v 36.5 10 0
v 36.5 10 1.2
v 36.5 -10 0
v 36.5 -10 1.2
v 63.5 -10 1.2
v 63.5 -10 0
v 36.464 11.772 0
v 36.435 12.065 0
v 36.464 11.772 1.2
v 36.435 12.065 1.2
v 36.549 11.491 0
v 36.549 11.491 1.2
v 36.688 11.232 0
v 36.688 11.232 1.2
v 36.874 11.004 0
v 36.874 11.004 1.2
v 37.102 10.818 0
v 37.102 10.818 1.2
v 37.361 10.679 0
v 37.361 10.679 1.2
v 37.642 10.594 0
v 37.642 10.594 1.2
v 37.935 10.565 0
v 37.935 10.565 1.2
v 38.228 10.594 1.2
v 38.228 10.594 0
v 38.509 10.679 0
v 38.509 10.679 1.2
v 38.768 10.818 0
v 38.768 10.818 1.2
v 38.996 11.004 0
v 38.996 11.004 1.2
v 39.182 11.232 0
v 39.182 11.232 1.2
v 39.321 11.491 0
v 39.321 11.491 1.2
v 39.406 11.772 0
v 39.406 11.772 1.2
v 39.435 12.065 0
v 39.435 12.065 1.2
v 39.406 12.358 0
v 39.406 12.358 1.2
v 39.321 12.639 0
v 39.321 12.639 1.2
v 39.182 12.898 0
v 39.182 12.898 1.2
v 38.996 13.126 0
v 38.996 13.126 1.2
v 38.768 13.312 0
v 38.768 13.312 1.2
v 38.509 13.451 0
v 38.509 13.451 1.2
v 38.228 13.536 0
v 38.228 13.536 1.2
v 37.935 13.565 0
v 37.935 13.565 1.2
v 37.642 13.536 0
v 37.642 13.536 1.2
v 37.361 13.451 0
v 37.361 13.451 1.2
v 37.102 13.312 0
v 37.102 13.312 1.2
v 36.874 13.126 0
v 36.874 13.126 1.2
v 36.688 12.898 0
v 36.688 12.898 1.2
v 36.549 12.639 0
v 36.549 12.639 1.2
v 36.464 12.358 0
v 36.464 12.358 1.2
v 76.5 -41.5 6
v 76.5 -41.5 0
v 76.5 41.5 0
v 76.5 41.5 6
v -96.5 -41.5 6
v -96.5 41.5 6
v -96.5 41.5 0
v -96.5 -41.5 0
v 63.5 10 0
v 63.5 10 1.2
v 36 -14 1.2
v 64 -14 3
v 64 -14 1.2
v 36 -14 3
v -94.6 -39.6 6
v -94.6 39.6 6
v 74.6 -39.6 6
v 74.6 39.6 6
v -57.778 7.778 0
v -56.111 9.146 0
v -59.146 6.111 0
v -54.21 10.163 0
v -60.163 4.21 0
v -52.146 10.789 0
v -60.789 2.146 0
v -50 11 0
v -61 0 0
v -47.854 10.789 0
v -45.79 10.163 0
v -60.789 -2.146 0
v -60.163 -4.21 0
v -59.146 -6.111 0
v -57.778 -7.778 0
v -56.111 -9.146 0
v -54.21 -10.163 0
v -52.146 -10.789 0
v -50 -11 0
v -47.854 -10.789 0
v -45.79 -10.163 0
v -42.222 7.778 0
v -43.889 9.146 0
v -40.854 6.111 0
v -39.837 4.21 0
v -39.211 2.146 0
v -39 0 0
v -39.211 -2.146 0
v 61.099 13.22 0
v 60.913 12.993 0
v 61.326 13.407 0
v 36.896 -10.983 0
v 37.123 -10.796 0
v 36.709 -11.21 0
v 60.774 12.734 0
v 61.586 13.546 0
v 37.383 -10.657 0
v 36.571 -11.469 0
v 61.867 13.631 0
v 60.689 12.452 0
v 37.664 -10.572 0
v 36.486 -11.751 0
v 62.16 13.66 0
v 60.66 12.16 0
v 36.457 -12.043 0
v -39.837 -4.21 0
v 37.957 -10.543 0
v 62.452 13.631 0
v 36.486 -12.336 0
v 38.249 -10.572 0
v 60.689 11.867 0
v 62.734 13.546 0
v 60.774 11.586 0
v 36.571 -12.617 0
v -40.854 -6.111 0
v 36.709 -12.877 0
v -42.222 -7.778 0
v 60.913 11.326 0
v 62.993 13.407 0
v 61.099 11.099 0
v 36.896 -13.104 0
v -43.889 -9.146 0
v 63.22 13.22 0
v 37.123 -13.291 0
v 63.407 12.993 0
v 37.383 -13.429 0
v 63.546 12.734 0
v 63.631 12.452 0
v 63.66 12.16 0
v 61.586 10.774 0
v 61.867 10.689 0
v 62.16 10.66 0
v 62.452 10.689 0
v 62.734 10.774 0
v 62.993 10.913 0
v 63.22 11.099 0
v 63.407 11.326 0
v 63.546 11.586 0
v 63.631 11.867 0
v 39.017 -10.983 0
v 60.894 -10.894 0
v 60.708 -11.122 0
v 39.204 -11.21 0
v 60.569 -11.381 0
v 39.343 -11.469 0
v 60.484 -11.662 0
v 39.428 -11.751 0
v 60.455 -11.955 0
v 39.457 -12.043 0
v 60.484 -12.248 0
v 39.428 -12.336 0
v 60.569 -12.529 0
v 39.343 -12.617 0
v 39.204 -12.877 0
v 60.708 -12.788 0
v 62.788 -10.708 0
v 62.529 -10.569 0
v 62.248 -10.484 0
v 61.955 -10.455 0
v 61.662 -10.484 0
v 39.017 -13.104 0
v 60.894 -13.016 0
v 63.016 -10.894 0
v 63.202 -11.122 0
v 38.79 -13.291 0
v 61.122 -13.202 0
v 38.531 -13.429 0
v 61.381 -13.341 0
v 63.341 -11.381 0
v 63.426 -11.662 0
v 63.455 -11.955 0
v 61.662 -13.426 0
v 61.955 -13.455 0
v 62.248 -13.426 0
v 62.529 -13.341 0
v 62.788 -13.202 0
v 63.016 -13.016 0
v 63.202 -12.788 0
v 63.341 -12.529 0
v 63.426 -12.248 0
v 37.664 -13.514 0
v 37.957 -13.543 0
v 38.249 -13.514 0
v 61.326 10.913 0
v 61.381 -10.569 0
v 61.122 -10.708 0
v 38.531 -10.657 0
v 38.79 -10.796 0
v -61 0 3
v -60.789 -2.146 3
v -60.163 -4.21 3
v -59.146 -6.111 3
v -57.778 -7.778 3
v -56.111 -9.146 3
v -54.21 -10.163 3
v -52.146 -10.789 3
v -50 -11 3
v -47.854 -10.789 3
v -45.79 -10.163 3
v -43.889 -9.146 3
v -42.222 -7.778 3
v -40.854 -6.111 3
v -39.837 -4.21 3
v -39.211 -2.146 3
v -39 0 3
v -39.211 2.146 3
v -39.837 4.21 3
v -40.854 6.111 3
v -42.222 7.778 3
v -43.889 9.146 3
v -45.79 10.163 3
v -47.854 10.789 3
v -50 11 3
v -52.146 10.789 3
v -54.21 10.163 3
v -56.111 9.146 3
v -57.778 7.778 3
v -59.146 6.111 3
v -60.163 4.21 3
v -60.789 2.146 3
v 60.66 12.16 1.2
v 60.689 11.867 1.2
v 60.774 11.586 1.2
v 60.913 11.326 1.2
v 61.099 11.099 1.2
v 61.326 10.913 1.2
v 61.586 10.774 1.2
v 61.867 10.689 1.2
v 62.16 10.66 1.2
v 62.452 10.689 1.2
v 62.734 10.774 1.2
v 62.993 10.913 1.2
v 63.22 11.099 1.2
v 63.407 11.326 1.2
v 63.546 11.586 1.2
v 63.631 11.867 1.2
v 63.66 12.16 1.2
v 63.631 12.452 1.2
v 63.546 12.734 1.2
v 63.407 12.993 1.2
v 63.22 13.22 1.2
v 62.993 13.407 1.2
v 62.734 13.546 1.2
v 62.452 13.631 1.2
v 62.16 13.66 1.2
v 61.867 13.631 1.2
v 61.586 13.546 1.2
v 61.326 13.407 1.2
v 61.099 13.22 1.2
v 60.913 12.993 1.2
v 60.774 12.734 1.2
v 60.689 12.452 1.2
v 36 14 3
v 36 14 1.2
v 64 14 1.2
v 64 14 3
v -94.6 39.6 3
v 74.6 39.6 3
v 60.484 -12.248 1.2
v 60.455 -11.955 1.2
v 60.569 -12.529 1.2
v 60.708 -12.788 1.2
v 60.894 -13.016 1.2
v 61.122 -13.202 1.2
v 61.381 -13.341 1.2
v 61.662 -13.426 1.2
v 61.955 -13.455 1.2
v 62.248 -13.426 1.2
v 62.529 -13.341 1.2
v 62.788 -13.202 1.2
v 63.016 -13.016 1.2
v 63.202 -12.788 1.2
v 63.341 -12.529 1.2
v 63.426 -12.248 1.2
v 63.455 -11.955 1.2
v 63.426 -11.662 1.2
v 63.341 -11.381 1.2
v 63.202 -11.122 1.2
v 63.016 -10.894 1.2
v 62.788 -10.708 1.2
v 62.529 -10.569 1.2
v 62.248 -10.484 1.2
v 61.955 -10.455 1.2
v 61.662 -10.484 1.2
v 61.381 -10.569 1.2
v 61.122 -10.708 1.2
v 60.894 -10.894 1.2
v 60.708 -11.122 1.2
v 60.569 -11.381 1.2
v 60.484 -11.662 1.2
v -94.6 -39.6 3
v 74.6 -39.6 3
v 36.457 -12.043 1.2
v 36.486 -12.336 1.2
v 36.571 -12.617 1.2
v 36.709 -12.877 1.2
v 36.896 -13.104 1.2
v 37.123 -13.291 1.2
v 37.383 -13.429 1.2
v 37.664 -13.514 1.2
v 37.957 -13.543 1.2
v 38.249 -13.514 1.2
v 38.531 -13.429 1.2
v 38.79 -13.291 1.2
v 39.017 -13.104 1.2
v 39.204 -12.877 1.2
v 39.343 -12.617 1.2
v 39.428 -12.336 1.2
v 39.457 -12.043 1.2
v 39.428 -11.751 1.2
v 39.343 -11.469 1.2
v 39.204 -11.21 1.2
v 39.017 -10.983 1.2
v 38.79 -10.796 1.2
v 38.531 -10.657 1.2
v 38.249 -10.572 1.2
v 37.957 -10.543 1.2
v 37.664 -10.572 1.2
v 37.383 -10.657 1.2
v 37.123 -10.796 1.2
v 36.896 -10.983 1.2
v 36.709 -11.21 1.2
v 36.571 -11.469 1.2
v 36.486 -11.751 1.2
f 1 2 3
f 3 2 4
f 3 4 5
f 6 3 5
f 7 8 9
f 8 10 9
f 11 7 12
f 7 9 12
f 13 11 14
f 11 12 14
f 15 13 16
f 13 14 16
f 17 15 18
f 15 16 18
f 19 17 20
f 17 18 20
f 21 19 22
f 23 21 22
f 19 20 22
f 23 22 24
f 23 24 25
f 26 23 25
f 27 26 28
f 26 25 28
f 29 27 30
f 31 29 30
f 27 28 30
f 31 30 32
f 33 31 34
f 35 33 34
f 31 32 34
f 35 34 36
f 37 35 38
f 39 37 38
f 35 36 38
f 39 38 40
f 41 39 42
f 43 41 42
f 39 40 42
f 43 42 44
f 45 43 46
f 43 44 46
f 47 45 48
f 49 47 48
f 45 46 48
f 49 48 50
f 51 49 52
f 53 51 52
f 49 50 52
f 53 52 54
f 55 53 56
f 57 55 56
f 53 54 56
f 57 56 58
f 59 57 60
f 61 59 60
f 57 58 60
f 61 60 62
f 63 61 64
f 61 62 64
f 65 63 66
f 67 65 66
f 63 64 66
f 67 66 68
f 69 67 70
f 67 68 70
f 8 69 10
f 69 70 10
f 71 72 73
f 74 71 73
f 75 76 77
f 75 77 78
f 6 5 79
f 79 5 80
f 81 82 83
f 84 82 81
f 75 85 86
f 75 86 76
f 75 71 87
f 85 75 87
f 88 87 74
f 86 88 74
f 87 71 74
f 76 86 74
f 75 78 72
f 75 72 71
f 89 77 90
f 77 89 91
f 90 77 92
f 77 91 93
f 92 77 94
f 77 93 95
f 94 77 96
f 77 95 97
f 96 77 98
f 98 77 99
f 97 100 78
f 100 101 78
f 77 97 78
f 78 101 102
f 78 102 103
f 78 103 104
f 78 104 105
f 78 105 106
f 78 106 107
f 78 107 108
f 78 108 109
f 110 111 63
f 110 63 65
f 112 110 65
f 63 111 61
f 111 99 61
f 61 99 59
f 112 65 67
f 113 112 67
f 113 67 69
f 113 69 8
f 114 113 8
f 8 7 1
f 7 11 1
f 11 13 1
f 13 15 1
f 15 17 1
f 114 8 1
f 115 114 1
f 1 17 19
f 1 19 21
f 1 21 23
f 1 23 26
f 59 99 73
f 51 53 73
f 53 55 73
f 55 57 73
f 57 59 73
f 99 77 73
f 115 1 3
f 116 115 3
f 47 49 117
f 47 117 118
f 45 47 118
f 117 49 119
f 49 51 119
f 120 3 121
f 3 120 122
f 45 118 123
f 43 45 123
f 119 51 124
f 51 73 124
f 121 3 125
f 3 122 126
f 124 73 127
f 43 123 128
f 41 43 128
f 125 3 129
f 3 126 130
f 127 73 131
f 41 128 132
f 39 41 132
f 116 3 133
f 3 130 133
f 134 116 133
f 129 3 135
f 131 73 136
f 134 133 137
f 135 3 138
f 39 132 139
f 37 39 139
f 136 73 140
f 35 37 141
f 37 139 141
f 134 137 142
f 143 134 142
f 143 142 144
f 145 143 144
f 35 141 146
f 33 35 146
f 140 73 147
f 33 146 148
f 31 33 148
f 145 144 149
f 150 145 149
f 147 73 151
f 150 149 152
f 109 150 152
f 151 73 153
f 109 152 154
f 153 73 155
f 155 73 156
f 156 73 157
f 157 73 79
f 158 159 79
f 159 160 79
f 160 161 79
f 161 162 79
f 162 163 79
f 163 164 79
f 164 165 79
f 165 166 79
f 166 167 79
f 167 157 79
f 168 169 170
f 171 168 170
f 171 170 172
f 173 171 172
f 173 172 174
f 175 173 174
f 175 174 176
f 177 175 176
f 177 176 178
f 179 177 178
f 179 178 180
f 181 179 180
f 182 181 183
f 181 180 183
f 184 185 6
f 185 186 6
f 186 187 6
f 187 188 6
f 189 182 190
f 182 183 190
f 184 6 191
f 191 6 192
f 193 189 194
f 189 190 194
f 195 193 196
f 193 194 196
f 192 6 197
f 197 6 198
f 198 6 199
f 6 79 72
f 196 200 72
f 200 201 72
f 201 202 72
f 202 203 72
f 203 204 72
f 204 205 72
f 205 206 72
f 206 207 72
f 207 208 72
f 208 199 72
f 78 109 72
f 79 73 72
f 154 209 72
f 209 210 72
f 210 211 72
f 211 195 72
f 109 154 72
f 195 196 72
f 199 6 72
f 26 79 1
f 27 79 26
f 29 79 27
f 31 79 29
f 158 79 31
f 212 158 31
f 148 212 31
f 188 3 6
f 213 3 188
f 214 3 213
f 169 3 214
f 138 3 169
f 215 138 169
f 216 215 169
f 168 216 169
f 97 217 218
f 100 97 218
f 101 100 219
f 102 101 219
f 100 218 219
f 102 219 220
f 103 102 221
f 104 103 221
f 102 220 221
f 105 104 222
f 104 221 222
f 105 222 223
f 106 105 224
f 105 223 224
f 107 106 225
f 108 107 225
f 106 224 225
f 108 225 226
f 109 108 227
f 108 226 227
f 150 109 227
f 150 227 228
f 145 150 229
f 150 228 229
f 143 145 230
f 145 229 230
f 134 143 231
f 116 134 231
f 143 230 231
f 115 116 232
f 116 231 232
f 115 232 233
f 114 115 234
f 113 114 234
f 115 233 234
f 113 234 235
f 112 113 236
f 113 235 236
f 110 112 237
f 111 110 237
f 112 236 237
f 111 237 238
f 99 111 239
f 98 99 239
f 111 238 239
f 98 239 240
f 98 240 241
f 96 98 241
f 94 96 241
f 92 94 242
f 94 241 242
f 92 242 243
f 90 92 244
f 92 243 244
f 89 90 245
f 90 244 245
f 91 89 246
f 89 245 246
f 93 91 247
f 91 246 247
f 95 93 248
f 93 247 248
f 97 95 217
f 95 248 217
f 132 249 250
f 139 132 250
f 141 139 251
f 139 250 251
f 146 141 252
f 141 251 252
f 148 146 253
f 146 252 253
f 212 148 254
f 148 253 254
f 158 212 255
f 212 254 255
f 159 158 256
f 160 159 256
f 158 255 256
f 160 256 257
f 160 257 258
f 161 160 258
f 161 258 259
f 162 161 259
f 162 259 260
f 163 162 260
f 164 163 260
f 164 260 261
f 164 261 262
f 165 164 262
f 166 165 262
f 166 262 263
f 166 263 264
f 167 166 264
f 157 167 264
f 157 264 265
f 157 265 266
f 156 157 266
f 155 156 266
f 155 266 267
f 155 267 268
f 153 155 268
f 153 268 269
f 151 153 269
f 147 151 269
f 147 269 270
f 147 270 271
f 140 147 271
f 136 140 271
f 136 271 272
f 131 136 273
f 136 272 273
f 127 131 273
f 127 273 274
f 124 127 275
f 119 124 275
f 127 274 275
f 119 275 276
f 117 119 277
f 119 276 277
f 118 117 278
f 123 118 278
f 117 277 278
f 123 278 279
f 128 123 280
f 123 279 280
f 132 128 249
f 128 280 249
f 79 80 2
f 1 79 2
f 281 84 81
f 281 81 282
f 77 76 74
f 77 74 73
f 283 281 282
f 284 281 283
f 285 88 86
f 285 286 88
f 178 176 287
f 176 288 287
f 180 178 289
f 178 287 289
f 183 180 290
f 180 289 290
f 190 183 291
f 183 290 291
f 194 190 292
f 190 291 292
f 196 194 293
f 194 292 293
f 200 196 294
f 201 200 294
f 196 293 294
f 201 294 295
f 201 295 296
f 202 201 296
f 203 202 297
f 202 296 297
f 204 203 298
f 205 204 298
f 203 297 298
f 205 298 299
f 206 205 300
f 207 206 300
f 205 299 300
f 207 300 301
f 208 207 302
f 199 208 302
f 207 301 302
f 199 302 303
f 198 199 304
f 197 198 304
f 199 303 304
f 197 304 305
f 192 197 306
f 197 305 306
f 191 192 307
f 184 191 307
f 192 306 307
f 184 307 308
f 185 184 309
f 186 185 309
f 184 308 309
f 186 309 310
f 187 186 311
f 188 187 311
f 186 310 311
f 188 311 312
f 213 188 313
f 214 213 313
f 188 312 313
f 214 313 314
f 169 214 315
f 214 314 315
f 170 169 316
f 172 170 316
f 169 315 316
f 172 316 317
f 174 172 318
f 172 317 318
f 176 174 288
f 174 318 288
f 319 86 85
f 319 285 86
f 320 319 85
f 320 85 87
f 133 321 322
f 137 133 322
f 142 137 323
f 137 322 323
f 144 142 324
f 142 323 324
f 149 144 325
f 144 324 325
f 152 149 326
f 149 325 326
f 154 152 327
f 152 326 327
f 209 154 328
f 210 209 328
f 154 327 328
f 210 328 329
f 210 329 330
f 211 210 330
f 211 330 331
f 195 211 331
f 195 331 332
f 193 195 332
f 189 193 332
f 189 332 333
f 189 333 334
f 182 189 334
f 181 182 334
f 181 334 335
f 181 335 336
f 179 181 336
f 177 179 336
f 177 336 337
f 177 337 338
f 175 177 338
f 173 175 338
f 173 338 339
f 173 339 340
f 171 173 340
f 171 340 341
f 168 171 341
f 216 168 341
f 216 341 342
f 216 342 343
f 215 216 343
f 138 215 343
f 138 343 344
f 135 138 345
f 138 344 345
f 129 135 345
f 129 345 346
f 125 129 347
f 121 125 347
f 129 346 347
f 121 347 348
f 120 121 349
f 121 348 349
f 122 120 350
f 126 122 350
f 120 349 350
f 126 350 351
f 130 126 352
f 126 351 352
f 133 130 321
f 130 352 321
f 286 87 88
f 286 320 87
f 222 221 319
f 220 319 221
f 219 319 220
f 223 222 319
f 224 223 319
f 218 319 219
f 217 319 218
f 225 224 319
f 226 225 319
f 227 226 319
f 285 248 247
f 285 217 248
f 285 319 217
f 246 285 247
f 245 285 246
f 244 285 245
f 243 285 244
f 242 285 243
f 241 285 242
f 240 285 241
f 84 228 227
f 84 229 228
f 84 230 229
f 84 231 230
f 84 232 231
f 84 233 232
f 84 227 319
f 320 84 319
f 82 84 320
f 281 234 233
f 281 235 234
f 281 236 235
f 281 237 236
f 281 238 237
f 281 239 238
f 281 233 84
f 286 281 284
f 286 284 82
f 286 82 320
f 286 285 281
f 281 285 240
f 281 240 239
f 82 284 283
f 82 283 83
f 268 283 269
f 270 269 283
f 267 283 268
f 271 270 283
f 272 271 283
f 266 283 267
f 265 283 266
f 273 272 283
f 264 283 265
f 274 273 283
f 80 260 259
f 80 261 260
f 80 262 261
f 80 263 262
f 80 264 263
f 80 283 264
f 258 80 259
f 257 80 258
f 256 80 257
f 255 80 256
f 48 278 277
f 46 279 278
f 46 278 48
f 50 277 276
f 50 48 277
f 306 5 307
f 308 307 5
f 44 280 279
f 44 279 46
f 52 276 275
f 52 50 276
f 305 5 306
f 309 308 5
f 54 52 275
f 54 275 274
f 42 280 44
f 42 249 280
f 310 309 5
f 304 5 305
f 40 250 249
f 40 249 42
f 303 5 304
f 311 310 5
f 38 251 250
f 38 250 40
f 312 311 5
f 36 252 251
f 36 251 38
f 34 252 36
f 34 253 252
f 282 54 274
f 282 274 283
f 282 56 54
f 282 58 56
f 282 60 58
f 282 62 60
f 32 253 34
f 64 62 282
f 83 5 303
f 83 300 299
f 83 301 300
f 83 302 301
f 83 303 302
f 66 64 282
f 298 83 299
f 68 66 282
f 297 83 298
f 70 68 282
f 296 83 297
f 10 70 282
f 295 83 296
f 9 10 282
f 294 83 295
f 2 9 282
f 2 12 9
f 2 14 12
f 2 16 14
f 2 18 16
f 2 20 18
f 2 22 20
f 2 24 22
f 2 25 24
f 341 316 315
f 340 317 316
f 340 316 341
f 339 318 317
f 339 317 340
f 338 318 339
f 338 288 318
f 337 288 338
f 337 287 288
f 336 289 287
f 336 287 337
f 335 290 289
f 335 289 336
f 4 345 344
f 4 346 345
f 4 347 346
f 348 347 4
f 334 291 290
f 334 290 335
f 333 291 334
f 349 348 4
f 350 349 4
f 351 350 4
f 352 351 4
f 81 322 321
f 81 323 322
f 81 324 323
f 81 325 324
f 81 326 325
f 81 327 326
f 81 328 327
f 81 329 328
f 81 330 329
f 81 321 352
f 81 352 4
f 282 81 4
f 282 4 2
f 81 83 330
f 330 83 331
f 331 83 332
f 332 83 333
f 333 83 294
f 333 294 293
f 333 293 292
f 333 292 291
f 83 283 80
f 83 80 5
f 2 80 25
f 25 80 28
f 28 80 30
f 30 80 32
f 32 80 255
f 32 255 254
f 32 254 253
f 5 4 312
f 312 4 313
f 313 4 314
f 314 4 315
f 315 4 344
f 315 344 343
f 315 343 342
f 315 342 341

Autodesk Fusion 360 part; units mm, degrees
sketch "Sketch1" plane through (0, 0, 0) normal (0, 0, 1) x (1, 0, 0)
  line L0 (76.5, 41.5) -> (-76.5, 41.5)
  line L1 (-76.5, 41.5) -> (-76.5, -41.5)
  line L2 (-76.5, -41.5) -> (76.5, -41.5)
  line L3 (76.5, -41.5) -> (76.5, 41.5)
  line L4 (76.5, 41.5) -> (-76.5, -41.5) construction
  line L5 (-76.5, 41.5) -> (76.5, -41.5) construction
  dimension "d1" = 153
  dimension "d2" = 83
extrude "Extrude1" add sketch "Sketch1" along normal blind 3
sketch "Sketch2" plane through (0, 0, 3) normal (0, 0, 1) x (-1, 0, 0)
  line L0 (-76.5, 41.5) -> (-76.5, -41.5)
  line L1 (-76.5, -41.5) -> (76.5, -41.5)
  line L2 (76.5, -41.5) -> (76.5, 41.5)
  line L3 (76.5, 41.5) -> (-76.5, 41.5)
  line L4 (-74.6, -39.6) -> (74.6, -39.6)
  line L5 (74.6, -39.6) -> (74.6, 39.6)
  line L6 (74.6, 39.6) -> (-74.6, 39.6)
  line L7 (-74.6, 39.6) -> (-74.6, -39.6)
  dimension "d5" = -1.9
extrude "Extrude2" add sketch "Sketch2" along normal blind 3
sketch "Sketch3" plane through (-76.5, 0, 0) normal (-1, 0, 0) x (0, -1, 0)
  line L0 (-41.5, 0) -> (41.5, 0)
  line L1 (41.5, 0) -> (41.5, 6)
  line L2 (41.5, 6) -> (-41.5, 6)
  line L3 (-41.5, 6) -> (-41.5, 0)
sketch "Sketch4" plane through (0, 0, 0) normal (0, 1, 0) x (1, 0, 0)
sketch "Sketch5" plane through (0, 0, 3) normal (0, 0, 1) x (-1, 0, 0)
  line L0 (-74.6, -39.6) -> (74.6, -39.6)
  line L1 (74.6, -39.6) -> (74.6, 39.6)
  line L2 (74.6, 39.6) -> (-74.6, 39.6)
  line L3 (-74.6, 39.6) -> (-74.6, -39.6)
  line L4 (-36.5, 10) -> (-63.5, 10)
  line L5 (-63.5, 10) -> (-63.5, -10)
  line L6 (-63.5, -10) -> (-36.5, -10)
  line L7 (-36.5, -10) -> (-36.5, 10)
  line L8 (-36.5, 10) -> (-63.5, -10) construction
  line L9 (-63.5, 10) -> (-36.5, -10) construction
  line L10 (-36, -14) -> (-64, -14)
  line L11 (-64, -14) -> (-64, 14)
  line L12 (-64, 14) -> (-36, 14)
  line L13 (-36, 14) -> (-36, -14)
  line L14 (-36, -14) -> (-64, 14) construction
  line L15 (-64, -14) -> (-36, 14) construction
  circle A0 centre (-37.9567, 12.0433) radius 1.5
  circle A1 centre (-61.9549, 11.9549) radius 1.5
  circle A2 centre (-62.1598, -12.1598) radius 1.5
  circle A3 centre (-37.9351, -12.0649) radius 1.5
  point P0 (-50, 0)
  point P1 (-50, 0)
  dimension "d8" = 27
  dimension "d9" = 20
  dimension "d12" = 28
  dimension "d13" = 28
  dimension "d14" = 3
  dimension "d15" = 3
  dimension "d16" = 3
  dimension "d17" = 3
extrude "Extrude3" cut sketch "Sketch5" against normal blind 3 contours L4 L5 L6 L7
extrude "Extrude4" cut sketch "Sketch5" against normal blind 4 contours A0
extrude "Extrude5" cut sketch "Sketch5" against normal blind 4 contours A1
extrude "Extrude6" cut sketch "Sketch5" against normal blind 4 contours A2
extrude "Extrude7" cut sketch "Sketch5" against normal blind 5 contours A3
extrude "Extrude8" cut sketch "Sketch5" against normal blind 1.8 contours L10 L11 L12 L13
extrude "Extrude9" add sketch "Sketch3" along normal blind 20
move_face "OffsetFaces1" offset -20 1 faces at (-74.6, 13.2, 5)
sketch "Sketch6" plane through (0, 0, 3) normal (0, 0, 1) x (-1, 0, 0)
  circle A0 centre (50, 0) radius 11
  dimension "d31" = 22
extrude "Extrude10" cut sketch "Sketch6" against normal blind 5
